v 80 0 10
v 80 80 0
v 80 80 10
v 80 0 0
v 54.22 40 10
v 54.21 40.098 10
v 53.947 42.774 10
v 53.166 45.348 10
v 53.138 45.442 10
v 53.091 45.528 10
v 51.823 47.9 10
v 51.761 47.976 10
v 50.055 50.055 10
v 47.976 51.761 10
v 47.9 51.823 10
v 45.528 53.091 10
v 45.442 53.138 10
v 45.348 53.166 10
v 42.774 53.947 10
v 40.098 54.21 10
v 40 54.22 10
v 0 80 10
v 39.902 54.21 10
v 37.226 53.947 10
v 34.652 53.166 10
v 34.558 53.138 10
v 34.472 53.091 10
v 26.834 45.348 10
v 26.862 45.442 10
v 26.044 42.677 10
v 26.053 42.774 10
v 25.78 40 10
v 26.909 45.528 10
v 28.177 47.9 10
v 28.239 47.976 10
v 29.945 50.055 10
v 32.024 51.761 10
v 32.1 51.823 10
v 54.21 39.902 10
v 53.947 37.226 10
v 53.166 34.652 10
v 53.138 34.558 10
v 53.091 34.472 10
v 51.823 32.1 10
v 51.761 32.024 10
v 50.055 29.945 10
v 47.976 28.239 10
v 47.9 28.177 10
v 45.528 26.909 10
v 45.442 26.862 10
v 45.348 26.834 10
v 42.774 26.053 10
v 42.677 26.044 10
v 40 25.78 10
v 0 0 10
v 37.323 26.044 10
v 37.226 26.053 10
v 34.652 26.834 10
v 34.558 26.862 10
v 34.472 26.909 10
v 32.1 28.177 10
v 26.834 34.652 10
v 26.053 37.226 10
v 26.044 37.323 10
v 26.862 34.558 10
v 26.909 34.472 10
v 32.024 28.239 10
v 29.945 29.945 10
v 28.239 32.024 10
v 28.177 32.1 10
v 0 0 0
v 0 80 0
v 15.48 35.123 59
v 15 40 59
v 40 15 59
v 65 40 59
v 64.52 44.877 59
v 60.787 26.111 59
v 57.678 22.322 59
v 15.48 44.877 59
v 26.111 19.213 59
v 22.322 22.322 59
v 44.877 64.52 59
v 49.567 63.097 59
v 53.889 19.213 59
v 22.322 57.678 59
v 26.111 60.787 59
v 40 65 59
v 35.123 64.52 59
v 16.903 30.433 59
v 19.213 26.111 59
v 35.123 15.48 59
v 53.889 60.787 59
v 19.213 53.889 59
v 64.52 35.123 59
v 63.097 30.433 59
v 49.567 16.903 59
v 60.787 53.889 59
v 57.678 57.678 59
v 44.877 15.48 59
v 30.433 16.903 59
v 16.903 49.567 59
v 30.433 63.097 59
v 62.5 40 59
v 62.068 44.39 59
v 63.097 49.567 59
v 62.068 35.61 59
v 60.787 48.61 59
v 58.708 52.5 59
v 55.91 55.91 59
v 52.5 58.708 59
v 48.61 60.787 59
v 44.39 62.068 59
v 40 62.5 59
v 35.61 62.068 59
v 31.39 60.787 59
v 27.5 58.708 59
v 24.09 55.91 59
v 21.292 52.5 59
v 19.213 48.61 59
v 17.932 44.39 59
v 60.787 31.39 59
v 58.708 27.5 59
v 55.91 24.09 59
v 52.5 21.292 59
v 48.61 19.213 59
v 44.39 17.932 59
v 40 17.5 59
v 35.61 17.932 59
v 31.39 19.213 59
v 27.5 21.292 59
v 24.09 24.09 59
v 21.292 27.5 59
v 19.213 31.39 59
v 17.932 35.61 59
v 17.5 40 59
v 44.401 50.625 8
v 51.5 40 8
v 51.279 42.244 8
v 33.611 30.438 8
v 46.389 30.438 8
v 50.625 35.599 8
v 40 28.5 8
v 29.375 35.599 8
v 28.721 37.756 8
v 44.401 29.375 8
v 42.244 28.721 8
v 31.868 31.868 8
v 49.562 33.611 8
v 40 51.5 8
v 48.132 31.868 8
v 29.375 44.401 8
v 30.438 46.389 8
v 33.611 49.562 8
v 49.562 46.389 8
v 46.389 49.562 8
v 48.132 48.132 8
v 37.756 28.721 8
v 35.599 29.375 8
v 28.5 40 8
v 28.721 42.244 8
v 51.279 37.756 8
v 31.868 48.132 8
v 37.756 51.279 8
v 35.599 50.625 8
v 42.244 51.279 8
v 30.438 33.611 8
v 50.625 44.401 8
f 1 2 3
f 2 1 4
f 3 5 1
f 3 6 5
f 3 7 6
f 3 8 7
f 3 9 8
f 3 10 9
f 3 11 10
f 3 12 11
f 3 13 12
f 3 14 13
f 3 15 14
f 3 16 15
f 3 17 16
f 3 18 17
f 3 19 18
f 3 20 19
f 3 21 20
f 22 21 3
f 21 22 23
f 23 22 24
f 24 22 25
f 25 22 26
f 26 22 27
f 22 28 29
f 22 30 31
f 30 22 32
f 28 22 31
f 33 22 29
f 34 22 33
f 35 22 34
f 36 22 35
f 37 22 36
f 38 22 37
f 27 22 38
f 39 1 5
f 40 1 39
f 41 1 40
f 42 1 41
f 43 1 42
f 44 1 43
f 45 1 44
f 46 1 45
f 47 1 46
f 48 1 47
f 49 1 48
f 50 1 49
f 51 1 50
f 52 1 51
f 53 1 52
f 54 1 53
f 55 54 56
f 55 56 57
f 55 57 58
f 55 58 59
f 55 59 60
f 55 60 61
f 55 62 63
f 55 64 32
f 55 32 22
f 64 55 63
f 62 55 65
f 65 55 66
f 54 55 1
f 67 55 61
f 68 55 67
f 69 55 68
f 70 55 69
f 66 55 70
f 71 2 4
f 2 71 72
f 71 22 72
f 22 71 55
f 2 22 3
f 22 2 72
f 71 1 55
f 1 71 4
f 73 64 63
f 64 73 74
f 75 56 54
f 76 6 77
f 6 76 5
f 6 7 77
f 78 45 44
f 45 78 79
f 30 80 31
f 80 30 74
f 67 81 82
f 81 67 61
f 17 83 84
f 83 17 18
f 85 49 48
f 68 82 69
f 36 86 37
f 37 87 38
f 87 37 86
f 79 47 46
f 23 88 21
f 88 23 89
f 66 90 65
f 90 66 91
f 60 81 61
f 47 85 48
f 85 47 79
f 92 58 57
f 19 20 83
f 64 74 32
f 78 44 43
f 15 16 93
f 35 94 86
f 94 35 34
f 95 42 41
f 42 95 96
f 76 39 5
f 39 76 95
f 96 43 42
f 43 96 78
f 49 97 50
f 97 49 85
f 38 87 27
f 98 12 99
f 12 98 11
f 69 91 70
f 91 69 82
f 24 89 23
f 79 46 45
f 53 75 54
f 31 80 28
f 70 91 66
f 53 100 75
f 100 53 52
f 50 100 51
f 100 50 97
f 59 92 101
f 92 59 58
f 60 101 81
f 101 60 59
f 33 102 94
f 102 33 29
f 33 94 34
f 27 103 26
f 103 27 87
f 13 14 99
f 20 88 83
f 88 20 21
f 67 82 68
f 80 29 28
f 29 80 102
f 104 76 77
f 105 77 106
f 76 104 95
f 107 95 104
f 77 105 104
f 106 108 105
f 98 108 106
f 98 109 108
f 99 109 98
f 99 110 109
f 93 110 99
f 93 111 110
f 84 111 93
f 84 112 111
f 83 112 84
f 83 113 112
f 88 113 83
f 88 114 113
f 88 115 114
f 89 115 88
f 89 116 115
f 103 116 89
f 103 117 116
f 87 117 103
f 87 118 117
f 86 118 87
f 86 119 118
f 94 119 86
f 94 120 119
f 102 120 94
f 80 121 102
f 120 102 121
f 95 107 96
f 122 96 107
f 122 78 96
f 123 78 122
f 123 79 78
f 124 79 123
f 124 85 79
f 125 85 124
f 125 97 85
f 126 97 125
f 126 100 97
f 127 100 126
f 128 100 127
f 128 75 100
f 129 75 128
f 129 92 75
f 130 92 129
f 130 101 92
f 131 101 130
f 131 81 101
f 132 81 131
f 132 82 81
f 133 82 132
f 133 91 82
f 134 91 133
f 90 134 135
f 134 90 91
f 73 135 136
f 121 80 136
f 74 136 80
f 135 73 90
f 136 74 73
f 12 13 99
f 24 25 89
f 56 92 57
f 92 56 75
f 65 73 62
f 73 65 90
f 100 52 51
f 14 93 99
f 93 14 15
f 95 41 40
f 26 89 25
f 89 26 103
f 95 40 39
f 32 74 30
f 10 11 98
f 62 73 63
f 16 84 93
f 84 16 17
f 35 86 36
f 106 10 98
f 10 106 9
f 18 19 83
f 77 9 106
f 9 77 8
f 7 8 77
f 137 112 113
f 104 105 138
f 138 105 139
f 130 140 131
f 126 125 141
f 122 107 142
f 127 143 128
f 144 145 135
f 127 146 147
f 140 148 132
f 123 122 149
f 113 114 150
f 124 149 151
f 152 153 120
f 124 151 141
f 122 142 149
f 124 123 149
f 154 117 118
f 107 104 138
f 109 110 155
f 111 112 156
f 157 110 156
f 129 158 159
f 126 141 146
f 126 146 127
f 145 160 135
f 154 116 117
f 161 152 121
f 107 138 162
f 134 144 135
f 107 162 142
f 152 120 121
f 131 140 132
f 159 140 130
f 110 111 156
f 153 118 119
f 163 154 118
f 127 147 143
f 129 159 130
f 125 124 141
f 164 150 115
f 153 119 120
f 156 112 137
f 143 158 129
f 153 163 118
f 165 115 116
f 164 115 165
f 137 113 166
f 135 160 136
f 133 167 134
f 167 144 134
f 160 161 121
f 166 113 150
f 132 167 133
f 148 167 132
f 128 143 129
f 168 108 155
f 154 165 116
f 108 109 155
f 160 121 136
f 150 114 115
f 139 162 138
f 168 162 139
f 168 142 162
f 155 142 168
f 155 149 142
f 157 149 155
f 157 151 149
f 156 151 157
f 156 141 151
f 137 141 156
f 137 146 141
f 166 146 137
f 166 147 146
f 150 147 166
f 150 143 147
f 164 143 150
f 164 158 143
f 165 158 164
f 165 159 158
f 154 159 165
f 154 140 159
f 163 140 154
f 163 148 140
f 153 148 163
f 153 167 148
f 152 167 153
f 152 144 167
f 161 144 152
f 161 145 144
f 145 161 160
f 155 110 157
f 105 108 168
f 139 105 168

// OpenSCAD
$fn = 32;

// ----------------------------------------------------------------------
// Hopper: funnel with square flange
// ----------------------------------------------------------------------

// --- parameters (mm) ---
fl = 80;                  // flange side, X and Y
fl_t = 10;                // flange thickness
cone_h = 50;              // cone height above the flange
top_d = 50;               // cone mouth diameter
bot_d = 28;               // cone spout diameter
wall = 2.5;               // cone wall thickness

bore_d = bot_d - 2 * wall;  // spout bore diameter
total_h = fl_t + cone_h - 1;  // overall height

difference() {
  union() {
    cube([fl, fl, fl_t]);
    translate([fl / 2, fl / 2, fl_t - 1])
      cylinder(h = cone_h, d1 = bot_d, d2 = top_d);
  }
  translate([fl / 2, fl / 2, fl_t - 2])
    cylinder(h = cone_h + 1, d1 = bore_d, d2 = top_d - 2 * wall);
}
